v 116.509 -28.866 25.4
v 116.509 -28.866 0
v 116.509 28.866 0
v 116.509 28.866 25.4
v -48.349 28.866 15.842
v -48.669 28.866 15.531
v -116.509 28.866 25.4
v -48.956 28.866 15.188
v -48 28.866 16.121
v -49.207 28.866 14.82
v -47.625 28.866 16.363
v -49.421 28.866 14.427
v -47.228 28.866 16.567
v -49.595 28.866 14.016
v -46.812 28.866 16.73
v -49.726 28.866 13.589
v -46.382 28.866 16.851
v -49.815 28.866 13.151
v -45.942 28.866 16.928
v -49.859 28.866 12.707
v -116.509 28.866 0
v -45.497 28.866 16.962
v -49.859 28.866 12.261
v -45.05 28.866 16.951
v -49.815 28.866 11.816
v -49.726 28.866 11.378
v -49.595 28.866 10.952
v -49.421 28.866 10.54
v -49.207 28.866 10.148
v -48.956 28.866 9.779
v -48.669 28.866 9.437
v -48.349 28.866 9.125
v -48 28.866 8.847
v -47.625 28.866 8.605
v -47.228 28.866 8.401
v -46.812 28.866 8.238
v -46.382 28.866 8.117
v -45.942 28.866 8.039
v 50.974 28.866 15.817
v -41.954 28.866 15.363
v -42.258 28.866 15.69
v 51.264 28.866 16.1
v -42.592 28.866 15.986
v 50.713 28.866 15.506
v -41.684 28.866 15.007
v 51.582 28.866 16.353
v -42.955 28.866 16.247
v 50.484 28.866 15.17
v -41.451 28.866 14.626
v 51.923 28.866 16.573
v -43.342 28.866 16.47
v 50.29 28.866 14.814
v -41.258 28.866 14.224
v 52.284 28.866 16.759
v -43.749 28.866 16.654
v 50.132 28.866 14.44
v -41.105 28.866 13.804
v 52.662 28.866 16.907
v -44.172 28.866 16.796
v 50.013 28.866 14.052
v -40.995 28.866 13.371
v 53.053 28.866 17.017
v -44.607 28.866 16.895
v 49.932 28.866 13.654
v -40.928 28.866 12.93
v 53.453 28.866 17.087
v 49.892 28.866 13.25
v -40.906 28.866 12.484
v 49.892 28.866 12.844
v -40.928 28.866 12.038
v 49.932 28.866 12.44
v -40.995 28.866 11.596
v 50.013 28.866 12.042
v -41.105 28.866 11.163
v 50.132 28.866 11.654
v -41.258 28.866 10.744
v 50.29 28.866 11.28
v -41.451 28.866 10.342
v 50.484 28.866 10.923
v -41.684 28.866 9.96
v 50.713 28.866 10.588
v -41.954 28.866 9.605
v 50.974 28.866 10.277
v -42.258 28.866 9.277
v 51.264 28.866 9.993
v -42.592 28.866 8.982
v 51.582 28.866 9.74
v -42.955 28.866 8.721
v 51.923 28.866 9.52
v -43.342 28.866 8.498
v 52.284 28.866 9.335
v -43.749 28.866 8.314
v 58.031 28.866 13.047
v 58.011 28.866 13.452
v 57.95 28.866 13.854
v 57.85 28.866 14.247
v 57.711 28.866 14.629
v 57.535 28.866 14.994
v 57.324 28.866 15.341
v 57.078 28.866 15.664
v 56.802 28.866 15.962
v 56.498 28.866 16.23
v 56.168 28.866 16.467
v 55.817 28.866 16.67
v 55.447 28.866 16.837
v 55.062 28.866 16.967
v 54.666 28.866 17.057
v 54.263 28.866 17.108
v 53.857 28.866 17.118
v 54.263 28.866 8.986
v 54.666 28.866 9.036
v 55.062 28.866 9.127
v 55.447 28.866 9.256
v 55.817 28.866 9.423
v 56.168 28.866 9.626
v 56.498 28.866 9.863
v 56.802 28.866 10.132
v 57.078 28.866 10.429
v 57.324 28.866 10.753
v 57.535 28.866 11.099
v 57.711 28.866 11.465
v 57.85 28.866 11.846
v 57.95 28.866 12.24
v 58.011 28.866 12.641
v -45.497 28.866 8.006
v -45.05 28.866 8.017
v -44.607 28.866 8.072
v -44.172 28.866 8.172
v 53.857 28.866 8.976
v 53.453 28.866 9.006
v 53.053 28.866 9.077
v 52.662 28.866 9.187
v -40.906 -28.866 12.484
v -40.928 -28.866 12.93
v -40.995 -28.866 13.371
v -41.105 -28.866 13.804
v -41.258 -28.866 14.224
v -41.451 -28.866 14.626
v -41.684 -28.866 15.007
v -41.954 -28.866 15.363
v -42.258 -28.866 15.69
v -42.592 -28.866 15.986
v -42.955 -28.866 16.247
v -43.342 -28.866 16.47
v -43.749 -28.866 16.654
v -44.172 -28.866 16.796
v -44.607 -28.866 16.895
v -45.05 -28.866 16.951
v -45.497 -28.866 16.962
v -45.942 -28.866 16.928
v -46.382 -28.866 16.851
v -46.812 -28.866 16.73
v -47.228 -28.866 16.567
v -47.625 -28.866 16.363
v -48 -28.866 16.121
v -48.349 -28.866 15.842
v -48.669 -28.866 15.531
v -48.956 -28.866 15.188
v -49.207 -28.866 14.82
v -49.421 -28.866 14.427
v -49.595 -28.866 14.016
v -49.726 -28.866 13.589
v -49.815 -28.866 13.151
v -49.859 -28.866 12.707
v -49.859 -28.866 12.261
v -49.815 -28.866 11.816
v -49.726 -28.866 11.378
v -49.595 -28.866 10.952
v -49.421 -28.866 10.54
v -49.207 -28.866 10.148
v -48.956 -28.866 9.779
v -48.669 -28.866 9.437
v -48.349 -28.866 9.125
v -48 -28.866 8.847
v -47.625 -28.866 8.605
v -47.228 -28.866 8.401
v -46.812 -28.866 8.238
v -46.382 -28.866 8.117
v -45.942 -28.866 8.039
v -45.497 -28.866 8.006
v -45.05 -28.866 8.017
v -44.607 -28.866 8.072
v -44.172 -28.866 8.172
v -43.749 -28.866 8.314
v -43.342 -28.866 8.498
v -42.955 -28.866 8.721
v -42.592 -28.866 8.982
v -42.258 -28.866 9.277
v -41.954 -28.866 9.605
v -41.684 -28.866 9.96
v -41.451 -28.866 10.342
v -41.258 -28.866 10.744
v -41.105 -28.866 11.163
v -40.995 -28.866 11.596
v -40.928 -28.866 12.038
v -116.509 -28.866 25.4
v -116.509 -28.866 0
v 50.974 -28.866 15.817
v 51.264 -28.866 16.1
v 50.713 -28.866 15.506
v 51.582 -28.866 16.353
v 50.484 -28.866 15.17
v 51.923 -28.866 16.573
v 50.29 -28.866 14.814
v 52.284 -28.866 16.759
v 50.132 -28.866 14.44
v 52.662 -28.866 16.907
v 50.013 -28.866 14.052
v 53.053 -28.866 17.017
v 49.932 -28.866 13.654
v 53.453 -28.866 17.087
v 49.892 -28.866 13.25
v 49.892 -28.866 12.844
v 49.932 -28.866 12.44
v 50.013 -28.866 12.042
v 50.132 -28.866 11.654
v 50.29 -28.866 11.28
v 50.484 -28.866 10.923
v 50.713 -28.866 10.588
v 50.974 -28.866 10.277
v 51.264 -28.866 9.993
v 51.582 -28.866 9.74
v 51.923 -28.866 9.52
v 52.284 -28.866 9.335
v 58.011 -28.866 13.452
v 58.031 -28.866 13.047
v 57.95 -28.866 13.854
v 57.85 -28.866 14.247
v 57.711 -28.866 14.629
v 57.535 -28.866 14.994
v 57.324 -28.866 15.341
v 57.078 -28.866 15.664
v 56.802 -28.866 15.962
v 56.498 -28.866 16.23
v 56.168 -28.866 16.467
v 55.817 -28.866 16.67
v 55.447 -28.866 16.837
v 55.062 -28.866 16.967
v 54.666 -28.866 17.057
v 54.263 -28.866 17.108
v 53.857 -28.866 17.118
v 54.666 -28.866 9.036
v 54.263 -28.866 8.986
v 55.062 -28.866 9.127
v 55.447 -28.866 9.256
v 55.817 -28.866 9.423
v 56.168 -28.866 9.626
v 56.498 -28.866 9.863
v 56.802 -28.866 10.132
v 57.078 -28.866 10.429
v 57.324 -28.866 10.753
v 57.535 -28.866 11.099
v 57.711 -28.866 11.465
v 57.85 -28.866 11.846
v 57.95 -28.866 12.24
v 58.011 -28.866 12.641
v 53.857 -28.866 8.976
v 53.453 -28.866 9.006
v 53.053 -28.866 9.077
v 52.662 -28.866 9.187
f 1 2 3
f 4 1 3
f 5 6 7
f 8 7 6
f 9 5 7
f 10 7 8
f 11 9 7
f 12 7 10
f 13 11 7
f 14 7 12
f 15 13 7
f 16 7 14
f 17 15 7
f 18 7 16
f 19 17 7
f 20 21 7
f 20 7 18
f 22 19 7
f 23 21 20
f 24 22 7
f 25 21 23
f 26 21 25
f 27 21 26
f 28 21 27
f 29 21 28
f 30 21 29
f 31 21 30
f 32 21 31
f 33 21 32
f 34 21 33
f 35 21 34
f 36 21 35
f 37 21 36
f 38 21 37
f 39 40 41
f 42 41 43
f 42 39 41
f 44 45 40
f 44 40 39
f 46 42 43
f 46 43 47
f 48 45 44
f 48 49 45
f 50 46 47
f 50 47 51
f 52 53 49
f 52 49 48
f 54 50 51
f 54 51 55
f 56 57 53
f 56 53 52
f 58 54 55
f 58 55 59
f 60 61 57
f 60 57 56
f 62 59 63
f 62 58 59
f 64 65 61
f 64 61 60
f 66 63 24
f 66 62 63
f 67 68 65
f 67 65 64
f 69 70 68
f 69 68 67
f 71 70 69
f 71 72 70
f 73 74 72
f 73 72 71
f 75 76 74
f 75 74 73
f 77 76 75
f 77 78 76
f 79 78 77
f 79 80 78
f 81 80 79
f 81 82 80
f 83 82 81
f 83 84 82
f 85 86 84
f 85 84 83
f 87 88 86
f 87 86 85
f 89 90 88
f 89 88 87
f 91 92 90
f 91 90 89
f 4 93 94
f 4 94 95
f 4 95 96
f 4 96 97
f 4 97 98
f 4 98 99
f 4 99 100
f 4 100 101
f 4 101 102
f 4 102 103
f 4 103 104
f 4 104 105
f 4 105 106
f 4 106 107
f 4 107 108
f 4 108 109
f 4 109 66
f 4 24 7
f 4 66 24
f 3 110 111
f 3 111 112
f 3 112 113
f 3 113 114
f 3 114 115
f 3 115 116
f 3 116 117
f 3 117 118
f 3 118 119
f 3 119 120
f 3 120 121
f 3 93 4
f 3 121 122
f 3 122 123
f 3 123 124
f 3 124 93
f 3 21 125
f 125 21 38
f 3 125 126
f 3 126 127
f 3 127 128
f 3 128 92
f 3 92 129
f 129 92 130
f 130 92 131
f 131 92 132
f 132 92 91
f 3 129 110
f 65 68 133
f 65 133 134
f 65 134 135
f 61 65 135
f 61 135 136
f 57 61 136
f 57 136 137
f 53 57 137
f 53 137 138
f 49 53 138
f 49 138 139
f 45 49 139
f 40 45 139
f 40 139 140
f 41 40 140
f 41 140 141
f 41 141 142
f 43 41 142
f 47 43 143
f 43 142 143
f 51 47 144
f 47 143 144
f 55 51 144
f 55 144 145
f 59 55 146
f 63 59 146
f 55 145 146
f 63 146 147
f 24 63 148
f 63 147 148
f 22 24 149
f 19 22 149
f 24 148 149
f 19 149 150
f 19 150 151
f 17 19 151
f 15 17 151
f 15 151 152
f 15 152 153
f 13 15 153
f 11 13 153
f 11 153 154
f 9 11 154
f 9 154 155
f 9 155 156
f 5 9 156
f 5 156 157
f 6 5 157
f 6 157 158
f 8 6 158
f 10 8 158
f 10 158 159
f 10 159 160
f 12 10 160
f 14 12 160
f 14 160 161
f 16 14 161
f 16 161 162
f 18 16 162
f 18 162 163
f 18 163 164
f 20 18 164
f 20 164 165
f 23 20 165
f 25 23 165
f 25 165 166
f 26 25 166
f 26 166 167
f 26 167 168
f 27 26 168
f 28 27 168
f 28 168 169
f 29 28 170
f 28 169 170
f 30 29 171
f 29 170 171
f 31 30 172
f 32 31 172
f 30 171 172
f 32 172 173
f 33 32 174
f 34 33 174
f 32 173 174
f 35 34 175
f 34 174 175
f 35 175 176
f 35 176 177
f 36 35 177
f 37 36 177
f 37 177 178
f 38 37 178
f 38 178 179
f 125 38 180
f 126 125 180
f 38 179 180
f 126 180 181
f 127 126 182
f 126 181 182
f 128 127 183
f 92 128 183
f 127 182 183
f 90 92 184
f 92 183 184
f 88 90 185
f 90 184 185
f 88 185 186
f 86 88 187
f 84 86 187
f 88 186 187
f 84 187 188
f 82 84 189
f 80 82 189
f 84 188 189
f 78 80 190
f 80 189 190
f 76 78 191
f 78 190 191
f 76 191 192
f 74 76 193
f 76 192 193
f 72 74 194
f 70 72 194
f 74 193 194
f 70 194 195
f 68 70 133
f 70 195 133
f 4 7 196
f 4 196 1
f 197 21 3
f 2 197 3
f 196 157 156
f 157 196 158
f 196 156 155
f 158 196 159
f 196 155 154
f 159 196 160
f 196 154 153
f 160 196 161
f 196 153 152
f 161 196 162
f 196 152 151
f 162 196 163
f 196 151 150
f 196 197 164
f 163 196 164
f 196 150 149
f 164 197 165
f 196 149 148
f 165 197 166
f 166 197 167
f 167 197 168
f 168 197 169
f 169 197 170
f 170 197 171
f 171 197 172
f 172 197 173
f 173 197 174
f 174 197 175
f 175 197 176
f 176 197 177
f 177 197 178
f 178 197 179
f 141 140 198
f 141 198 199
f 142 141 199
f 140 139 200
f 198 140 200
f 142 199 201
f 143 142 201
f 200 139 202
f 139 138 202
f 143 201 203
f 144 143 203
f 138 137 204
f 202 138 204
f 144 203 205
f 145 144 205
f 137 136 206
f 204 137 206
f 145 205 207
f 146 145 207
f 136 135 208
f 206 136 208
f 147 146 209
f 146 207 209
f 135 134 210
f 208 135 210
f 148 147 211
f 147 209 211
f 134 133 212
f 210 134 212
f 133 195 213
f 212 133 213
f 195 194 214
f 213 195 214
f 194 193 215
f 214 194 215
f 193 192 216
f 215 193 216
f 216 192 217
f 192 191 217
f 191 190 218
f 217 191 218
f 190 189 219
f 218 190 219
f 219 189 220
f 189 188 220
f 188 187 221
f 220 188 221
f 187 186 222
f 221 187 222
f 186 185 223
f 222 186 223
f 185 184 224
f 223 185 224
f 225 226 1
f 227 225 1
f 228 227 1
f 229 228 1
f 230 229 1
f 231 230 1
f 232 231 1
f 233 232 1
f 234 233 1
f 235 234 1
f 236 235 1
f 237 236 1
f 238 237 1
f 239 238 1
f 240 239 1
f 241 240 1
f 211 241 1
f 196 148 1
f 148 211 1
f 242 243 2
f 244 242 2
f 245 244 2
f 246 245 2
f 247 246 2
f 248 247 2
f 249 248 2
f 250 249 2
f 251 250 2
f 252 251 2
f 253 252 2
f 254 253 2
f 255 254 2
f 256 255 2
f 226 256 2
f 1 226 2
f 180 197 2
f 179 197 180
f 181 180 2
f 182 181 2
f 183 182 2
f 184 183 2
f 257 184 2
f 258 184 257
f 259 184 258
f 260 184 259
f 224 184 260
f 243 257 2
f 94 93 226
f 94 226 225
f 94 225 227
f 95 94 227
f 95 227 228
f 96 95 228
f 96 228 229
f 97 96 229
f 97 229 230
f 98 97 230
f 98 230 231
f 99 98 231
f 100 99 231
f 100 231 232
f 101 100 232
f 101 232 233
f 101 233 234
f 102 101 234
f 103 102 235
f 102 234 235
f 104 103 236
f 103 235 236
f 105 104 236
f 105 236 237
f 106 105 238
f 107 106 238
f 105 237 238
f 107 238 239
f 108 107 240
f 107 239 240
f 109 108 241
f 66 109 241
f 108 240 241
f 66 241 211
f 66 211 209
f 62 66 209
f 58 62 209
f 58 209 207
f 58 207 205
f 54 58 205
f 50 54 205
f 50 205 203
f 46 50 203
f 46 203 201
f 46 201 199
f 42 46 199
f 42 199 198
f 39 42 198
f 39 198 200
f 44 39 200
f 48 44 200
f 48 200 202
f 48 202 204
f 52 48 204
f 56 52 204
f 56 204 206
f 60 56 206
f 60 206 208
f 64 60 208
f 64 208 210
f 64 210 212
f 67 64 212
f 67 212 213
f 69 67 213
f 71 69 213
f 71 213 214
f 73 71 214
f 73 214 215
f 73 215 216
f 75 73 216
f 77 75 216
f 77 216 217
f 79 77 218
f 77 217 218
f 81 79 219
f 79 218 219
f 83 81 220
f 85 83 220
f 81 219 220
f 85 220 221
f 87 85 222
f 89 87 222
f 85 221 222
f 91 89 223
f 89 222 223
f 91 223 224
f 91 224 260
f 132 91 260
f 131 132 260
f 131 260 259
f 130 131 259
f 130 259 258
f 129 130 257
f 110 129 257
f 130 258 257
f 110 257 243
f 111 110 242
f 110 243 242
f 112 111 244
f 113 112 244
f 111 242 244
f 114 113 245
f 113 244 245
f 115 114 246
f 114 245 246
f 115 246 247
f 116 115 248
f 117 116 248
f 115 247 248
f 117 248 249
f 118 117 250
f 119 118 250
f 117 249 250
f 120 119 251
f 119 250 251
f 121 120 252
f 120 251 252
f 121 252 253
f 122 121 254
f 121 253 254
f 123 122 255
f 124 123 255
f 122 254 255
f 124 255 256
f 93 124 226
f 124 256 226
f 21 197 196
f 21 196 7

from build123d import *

# Parameters (mm, degrees)
F0_W     = 233.017758
F0_H     = 57.732466
F1_DEPTH = 25.4
F2_R     = 4.479401
F2_R_2   = 4.072179
F3_DEPTH = 57.733467


with BuildPart() as f1:
    # F0 (on Top) → F1 (new body)
    with BuildSketch(Plane.XY):
        Rectangle(F0_W, F0_H)
    extrude(amount=F1_DEPTH)

    # F2 (on face) → F3 (cut, through all)
    with BuildSketch(Plane.XZ.offset(28.866233)):
        with Locations((-45.385242, 12.48381)):
            Circle(F2_R)
        with Locations((53.958915, 13.046741)):
            Circle(F2_R_2)
    extrude(amount=-F3_DEPTH, mode=Mode.SUBTRACT)


solid = f1.part
